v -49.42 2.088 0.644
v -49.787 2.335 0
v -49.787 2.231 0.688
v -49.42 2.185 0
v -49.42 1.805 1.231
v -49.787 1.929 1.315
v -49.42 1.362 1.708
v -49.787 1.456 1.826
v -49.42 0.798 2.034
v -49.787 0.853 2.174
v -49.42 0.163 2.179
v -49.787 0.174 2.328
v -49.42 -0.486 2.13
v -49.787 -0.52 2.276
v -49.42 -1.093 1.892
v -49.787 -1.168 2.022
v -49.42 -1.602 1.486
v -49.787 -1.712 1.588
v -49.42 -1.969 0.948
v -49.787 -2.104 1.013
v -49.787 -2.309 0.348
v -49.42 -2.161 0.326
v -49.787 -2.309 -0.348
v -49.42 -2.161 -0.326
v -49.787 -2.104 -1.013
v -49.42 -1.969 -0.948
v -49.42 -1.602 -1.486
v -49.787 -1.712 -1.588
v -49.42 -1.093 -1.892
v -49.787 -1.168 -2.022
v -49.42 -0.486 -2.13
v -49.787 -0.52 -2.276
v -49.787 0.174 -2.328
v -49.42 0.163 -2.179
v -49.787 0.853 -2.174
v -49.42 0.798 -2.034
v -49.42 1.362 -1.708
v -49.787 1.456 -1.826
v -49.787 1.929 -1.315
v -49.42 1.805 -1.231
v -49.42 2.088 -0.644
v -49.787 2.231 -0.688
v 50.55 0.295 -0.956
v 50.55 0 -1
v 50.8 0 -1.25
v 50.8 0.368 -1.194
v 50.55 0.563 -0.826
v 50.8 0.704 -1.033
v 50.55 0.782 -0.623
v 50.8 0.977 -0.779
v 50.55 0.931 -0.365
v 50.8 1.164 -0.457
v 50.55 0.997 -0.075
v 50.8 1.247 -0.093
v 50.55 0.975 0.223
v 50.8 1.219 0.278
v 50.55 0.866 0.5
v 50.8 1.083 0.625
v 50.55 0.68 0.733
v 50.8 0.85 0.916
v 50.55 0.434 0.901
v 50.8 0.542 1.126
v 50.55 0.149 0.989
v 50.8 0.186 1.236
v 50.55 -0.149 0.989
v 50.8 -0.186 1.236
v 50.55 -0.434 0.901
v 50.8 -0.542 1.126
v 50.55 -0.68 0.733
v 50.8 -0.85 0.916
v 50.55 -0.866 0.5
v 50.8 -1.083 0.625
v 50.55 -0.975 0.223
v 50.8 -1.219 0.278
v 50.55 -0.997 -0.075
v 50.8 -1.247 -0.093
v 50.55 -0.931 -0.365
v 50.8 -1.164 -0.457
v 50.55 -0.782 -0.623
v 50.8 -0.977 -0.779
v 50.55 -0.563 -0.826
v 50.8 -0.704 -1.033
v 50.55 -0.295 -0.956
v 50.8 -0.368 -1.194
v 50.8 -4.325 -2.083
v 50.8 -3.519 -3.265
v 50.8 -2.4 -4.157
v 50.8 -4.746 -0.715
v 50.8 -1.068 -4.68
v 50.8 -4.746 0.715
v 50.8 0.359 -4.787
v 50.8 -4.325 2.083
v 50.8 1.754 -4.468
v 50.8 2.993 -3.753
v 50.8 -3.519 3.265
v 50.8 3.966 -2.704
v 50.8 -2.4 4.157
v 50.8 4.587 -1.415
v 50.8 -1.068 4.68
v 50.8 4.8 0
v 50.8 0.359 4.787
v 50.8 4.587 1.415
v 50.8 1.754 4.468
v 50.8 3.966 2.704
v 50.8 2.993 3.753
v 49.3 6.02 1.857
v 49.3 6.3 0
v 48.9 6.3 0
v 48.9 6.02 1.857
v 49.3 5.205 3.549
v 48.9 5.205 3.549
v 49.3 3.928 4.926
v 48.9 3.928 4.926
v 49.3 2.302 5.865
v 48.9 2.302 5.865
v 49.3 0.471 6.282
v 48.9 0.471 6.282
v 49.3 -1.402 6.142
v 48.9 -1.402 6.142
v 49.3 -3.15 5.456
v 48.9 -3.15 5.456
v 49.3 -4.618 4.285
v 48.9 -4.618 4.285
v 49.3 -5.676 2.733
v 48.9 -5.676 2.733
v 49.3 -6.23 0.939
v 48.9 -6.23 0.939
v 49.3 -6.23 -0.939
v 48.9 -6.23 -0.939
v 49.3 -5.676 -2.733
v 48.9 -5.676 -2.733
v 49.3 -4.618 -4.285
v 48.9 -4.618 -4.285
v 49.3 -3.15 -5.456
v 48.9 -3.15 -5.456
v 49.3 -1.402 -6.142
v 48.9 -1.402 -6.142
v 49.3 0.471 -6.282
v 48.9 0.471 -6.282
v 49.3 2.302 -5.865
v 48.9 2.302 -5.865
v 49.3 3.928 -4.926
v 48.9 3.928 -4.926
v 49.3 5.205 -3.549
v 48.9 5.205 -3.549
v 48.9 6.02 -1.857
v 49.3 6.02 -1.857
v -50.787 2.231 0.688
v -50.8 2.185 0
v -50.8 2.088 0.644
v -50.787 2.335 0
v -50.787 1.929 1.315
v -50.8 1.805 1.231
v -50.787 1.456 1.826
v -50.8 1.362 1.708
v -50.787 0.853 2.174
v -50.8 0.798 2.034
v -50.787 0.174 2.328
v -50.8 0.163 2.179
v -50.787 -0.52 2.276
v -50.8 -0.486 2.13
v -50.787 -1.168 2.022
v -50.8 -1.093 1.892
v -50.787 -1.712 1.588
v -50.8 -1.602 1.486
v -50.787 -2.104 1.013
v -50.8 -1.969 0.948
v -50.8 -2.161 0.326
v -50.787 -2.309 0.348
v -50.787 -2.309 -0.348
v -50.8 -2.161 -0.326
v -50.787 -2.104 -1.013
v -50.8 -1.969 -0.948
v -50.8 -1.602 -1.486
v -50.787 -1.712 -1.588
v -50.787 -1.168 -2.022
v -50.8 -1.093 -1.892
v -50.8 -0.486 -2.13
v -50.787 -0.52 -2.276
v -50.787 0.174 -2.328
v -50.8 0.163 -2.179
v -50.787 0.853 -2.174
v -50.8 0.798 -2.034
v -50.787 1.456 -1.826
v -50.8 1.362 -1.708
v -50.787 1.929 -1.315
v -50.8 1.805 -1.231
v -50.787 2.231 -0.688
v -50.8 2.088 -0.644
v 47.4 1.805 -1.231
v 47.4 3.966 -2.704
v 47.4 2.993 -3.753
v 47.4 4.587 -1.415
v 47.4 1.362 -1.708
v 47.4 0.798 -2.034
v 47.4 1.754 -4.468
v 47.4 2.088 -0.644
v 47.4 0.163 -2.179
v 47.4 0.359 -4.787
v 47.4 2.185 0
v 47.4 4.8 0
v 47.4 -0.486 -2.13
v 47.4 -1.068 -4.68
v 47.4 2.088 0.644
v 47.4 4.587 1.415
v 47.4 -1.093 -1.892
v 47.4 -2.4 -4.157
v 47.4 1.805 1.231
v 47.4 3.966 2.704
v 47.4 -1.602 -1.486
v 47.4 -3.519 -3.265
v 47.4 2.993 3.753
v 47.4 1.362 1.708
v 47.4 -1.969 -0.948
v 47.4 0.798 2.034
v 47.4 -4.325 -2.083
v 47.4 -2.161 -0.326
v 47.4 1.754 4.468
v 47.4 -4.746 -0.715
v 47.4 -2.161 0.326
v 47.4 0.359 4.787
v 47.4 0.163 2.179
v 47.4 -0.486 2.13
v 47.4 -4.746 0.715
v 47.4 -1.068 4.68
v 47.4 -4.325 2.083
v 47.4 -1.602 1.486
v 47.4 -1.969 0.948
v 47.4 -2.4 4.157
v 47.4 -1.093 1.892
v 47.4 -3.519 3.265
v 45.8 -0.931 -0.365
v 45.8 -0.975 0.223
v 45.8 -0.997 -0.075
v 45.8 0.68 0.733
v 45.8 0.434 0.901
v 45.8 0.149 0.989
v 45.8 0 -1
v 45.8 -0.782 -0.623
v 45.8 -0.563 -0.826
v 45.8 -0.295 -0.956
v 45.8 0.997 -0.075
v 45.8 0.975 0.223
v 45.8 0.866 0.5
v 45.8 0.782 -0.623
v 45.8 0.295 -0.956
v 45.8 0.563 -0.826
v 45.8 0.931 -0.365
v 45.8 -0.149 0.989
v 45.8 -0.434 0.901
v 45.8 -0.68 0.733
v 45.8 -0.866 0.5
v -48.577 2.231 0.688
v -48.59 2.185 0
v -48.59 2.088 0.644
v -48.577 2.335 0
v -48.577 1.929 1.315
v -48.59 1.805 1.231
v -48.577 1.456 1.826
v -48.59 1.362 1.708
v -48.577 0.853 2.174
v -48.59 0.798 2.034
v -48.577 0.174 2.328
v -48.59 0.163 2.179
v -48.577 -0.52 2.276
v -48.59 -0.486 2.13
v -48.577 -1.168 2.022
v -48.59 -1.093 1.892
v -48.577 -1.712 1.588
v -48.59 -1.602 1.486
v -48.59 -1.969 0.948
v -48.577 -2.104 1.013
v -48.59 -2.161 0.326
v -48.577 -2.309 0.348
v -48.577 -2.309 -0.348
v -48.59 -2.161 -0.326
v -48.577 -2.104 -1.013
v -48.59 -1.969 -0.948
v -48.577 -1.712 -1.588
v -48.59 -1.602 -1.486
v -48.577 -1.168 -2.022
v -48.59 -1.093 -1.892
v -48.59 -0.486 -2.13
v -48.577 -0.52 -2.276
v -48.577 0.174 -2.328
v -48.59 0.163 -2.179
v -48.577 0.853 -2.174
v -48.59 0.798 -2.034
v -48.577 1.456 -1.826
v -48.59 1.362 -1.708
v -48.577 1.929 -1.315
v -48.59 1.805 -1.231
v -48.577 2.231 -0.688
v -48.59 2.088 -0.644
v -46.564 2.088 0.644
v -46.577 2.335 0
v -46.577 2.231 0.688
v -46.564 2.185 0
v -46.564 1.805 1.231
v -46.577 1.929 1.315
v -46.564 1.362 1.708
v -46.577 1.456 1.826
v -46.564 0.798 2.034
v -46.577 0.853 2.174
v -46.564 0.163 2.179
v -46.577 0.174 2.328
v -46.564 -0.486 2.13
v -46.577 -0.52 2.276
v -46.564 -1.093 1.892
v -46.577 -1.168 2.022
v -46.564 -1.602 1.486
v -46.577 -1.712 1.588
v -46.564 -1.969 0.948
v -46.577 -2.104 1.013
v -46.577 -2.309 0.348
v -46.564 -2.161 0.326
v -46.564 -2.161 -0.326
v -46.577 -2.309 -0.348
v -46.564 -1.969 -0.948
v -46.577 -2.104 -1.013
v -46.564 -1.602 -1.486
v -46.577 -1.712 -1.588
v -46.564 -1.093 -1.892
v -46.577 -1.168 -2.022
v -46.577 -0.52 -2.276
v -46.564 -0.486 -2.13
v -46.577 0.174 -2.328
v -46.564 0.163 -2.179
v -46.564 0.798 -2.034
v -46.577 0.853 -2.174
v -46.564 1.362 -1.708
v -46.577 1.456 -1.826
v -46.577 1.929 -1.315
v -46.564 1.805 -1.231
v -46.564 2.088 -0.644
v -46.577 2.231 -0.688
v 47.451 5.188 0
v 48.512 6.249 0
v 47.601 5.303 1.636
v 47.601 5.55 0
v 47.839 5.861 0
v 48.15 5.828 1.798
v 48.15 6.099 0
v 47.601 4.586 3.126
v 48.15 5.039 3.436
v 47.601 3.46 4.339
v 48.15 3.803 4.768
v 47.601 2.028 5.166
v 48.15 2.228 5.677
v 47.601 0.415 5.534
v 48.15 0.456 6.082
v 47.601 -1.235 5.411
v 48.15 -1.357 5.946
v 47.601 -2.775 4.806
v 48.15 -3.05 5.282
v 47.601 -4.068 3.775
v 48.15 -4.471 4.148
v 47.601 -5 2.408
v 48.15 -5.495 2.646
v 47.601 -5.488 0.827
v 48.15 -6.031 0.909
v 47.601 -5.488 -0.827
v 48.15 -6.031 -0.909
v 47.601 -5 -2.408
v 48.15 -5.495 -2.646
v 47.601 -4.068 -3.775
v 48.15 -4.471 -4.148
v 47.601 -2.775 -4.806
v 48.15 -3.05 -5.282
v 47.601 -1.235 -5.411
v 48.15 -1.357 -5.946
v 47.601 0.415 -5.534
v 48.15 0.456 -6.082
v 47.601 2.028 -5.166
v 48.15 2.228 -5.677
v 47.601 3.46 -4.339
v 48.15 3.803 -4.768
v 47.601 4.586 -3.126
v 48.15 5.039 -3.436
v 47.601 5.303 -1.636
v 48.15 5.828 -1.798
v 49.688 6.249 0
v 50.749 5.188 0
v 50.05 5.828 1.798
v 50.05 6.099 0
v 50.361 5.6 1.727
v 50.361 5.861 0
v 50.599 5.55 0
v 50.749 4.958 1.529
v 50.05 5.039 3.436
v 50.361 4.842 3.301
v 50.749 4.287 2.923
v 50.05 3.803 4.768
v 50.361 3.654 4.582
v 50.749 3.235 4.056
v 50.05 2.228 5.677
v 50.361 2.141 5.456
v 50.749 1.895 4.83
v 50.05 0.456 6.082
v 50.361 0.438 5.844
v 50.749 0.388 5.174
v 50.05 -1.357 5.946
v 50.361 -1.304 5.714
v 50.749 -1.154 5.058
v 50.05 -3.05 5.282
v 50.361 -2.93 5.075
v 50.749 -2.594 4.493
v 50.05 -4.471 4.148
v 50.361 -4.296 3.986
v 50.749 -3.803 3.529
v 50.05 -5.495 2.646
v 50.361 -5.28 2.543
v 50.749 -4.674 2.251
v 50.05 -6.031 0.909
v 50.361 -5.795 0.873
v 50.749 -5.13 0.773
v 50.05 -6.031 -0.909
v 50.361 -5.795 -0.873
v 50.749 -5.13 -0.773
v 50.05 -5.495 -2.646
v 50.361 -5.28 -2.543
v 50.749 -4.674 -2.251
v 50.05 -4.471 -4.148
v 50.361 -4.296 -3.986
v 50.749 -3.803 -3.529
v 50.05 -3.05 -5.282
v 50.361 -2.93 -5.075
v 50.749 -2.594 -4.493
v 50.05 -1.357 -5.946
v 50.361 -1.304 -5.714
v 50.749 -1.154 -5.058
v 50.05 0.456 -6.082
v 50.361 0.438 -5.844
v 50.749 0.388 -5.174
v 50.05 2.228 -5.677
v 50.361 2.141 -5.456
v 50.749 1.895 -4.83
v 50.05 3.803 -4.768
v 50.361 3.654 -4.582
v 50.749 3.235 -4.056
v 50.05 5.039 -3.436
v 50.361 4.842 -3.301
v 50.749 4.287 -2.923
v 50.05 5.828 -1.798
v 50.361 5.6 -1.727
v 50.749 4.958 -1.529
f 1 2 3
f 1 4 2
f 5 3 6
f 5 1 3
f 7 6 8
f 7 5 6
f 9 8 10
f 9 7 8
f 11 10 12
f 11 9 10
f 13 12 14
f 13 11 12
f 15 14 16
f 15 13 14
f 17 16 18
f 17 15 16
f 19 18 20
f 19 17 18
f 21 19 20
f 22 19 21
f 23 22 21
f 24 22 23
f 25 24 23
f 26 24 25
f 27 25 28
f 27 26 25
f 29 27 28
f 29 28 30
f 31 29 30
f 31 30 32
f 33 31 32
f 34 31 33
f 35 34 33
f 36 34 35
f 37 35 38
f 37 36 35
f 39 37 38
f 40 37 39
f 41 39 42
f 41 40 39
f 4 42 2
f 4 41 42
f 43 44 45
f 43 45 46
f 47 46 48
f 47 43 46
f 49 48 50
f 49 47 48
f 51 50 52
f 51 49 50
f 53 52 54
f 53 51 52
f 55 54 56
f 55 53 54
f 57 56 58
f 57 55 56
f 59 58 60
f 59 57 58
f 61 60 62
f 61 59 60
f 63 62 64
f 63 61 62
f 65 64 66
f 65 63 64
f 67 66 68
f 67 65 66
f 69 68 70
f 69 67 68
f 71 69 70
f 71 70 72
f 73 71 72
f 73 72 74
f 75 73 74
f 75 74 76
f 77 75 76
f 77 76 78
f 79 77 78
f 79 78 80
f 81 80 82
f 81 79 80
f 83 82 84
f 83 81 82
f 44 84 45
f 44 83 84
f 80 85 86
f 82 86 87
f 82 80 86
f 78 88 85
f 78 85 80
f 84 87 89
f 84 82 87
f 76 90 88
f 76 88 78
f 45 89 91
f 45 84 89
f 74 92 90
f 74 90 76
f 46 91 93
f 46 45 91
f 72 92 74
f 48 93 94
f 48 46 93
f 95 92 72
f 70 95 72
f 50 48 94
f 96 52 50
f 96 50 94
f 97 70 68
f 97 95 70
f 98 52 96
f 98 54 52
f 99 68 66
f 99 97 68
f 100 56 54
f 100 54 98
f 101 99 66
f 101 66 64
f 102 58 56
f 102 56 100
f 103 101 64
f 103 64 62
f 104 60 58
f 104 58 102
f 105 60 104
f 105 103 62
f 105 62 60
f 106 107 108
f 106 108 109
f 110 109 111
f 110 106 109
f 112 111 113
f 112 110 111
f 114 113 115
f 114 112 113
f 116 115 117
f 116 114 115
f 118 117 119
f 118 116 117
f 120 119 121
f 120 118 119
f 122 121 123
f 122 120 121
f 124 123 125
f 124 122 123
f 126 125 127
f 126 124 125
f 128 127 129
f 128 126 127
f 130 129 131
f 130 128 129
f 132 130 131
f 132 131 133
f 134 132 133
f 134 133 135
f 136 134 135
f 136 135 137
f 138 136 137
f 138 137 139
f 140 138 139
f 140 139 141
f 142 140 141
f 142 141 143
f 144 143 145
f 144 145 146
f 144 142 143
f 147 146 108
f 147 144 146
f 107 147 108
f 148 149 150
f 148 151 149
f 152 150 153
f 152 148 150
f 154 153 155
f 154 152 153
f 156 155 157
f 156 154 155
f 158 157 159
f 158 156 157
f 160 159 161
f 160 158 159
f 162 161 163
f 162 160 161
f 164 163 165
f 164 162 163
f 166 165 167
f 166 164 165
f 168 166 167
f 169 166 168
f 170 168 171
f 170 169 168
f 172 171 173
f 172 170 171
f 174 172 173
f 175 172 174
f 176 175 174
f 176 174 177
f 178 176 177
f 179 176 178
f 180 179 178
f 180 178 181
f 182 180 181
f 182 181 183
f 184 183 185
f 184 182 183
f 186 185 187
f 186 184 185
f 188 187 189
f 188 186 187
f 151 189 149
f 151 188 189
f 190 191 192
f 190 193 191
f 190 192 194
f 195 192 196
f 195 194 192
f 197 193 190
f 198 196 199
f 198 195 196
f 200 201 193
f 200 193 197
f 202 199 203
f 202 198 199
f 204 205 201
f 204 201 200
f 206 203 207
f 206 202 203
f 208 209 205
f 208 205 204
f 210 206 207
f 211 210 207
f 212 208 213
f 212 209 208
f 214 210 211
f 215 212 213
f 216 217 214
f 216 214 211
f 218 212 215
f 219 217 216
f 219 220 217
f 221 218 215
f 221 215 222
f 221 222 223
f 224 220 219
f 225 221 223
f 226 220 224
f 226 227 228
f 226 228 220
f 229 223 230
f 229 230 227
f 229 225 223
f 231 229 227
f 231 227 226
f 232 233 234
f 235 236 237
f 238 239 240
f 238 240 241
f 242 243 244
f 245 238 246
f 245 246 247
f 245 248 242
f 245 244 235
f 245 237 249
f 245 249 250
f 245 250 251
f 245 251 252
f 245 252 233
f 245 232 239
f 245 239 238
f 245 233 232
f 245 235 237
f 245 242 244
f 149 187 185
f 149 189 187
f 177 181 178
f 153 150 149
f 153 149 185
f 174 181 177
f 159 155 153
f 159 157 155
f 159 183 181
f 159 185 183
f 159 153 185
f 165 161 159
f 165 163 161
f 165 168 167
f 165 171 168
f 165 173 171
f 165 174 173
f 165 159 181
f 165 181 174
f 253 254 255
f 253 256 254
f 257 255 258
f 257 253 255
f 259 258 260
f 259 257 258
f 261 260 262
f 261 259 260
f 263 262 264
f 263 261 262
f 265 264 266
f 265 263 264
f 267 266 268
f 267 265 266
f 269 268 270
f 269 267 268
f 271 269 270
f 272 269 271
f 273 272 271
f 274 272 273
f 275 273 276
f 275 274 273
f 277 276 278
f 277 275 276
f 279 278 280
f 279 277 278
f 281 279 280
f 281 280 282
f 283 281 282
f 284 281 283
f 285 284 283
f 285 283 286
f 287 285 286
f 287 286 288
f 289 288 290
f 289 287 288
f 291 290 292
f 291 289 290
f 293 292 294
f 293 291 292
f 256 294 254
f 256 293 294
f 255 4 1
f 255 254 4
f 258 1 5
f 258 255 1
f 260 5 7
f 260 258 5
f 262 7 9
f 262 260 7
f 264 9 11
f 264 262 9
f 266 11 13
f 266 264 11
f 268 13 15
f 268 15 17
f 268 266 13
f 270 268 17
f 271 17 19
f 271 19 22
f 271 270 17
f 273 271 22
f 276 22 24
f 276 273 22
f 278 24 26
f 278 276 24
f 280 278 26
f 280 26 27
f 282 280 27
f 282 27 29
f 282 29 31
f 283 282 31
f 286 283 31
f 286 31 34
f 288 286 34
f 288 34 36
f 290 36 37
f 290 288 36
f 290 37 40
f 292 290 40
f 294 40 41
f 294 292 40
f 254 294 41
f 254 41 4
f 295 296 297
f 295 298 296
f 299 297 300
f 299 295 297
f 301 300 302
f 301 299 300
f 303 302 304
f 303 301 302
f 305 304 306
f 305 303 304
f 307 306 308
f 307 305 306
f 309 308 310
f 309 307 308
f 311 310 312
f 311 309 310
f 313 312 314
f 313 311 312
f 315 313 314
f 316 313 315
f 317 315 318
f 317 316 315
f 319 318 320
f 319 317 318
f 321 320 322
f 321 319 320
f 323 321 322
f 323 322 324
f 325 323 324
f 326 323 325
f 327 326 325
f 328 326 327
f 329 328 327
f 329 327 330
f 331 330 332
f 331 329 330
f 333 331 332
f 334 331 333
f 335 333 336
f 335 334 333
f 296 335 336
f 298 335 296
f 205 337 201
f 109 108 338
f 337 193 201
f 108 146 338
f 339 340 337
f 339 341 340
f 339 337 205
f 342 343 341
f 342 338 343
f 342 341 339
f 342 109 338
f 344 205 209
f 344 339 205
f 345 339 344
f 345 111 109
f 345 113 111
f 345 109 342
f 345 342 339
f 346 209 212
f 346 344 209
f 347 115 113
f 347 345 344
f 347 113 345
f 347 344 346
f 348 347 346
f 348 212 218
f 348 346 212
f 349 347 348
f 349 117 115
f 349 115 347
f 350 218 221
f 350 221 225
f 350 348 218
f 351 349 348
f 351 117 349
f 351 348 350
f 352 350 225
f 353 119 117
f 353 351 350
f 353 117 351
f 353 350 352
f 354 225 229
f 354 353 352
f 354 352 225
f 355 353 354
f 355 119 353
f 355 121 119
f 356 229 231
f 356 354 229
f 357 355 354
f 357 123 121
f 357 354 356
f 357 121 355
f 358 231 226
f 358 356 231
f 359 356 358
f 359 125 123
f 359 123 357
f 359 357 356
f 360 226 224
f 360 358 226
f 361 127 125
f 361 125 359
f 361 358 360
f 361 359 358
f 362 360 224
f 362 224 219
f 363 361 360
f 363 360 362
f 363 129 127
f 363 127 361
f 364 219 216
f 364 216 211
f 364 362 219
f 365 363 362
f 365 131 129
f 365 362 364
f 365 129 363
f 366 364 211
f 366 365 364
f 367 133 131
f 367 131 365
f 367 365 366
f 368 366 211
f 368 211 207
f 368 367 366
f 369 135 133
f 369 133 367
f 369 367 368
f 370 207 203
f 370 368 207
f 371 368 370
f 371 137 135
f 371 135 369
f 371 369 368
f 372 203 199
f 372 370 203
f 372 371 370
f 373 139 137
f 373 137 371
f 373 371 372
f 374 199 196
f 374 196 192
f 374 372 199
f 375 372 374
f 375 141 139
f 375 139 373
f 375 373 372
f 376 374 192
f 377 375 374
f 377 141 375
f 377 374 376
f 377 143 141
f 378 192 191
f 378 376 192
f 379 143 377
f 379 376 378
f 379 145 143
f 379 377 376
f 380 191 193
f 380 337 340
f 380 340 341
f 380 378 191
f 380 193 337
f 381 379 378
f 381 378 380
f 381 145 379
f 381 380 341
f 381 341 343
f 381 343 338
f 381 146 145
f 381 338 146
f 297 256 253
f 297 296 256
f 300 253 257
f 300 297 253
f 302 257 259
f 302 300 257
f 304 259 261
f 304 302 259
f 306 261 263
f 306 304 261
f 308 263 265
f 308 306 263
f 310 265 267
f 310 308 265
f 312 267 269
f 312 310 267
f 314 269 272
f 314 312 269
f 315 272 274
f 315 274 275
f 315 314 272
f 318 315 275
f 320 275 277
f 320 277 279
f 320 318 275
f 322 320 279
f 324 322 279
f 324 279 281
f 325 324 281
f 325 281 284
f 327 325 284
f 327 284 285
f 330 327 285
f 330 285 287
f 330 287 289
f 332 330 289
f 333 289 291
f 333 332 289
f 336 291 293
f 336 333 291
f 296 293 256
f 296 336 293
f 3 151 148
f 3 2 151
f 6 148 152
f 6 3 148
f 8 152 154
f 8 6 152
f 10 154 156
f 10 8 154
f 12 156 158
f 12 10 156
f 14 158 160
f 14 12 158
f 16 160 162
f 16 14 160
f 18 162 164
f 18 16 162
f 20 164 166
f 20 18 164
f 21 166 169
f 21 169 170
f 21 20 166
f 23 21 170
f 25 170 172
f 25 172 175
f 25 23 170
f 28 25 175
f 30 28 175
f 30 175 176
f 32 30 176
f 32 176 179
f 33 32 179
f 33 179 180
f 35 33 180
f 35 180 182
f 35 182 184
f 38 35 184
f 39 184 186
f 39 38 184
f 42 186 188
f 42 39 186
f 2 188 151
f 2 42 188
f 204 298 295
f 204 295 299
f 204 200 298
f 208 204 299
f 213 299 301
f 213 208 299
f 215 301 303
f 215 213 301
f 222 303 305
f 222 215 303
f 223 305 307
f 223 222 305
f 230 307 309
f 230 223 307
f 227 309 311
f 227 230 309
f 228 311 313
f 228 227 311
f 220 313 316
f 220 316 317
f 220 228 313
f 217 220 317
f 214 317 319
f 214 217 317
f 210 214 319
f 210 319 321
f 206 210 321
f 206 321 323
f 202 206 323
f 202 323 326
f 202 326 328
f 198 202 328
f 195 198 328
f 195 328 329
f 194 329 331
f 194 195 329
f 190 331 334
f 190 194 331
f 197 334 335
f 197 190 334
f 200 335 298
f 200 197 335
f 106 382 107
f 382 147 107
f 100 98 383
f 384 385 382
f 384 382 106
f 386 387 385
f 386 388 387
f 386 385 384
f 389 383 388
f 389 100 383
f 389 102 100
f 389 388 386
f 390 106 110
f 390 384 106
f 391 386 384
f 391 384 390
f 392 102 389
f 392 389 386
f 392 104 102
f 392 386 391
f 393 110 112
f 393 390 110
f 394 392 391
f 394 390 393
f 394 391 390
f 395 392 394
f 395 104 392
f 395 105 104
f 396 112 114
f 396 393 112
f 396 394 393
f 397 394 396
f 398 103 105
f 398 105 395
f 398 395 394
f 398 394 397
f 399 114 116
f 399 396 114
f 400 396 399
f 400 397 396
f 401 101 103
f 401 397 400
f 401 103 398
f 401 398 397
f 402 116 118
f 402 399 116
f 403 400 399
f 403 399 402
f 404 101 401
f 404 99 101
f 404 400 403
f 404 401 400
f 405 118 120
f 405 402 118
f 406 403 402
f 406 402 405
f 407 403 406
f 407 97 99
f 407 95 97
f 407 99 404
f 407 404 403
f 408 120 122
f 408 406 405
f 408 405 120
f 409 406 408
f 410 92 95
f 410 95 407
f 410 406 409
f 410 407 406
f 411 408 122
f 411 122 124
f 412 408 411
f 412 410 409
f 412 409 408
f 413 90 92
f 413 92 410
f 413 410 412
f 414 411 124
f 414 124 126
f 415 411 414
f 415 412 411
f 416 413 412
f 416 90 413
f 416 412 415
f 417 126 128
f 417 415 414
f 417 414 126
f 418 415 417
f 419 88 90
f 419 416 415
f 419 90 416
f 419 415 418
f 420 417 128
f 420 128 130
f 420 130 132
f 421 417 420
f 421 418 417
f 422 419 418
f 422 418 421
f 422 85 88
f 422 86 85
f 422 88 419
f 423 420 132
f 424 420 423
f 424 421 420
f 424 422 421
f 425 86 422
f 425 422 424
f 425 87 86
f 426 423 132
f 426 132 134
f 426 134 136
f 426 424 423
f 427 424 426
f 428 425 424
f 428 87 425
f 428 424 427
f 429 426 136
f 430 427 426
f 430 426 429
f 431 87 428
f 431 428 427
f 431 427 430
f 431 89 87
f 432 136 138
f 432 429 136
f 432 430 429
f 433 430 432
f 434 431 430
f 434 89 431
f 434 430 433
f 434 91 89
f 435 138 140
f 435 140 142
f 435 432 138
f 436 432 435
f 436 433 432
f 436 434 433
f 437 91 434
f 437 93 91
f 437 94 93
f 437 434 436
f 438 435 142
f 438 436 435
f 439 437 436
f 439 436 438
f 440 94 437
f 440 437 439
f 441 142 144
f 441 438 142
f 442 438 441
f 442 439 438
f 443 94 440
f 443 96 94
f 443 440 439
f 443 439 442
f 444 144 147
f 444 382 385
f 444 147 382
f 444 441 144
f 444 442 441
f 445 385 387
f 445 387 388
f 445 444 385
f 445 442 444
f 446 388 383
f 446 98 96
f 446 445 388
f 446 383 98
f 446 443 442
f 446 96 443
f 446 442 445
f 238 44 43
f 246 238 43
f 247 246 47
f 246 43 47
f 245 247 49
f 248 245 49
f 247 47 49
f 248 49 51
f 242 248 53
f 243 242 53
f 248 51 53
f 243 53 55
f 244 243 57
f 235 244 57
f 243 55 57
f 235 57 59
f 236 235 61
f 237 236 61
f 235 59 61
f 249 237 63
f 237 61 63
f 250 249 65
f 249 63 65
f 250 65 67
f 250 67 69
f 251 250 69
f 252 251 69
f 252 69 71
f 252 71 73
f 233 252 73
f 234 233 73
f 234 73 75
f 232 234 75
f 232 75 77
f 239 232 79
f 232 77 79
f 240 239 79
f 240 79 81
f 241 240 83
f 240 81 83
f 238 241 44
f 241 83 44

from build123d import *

# Parameters (mm, degrees)
SKETCH2_R          = 1
CUT_EXTRUDE1_DEPTH = 5
FILLET1_R          = 1.5
CHAMFER1_SIZE      = 0.25


with BuildPart() as part:
    # Sketch1 → Revolve1 (revolve)
    with BuildSketch(Plane.XY):
        Polygon((-49.42, 2.185), (-48.59, 2.185), (-48.5768767, 2.335), (-46.5768767, 2.335), (-46.563753401, 2.185), (47.4, 2.185), (47.4, 6.3), (50.8, 6.3), (50.8, 0), (-50.8, 0), (-50.8, 2.185), (-50.7868767, 2.335), (-49.7868767, 2.335), align=None)
    revolve(axis=Axis((-50.8, 0, 0), (1, 0, 0)))

    # Sketch2 → Cut-Extrude1 (cut)
    with BuildSketch(Plane(origin=(50.8, 0, 0), x_dir=(0, 0, -1), z_dir=(1, 0, 0))):
        Circle(SKETCH2_R)
    extrude(amount=-CUT_EXTRUDE1_DEPTH, mode=Mode.SUBTRACT)

    # Fillet1
    fillet1_edges = [part.edges().sort_by_distance(p)[0] for p in [
        (47.4, -6.3, 0),
        (50.8, -6.3, 0),
    ]]
    fillet(fillet1_edges, radius=FILLET1_R)

    # Chamfer1
    chamfer1_edges = [part.edges().sort_by_distance(p)[0] for p in [
        (50.8, 0, 1),
    ]]
    chamfer(chamfer1_edges, length=CHAMFER1_SIZE)


solid = part.part
